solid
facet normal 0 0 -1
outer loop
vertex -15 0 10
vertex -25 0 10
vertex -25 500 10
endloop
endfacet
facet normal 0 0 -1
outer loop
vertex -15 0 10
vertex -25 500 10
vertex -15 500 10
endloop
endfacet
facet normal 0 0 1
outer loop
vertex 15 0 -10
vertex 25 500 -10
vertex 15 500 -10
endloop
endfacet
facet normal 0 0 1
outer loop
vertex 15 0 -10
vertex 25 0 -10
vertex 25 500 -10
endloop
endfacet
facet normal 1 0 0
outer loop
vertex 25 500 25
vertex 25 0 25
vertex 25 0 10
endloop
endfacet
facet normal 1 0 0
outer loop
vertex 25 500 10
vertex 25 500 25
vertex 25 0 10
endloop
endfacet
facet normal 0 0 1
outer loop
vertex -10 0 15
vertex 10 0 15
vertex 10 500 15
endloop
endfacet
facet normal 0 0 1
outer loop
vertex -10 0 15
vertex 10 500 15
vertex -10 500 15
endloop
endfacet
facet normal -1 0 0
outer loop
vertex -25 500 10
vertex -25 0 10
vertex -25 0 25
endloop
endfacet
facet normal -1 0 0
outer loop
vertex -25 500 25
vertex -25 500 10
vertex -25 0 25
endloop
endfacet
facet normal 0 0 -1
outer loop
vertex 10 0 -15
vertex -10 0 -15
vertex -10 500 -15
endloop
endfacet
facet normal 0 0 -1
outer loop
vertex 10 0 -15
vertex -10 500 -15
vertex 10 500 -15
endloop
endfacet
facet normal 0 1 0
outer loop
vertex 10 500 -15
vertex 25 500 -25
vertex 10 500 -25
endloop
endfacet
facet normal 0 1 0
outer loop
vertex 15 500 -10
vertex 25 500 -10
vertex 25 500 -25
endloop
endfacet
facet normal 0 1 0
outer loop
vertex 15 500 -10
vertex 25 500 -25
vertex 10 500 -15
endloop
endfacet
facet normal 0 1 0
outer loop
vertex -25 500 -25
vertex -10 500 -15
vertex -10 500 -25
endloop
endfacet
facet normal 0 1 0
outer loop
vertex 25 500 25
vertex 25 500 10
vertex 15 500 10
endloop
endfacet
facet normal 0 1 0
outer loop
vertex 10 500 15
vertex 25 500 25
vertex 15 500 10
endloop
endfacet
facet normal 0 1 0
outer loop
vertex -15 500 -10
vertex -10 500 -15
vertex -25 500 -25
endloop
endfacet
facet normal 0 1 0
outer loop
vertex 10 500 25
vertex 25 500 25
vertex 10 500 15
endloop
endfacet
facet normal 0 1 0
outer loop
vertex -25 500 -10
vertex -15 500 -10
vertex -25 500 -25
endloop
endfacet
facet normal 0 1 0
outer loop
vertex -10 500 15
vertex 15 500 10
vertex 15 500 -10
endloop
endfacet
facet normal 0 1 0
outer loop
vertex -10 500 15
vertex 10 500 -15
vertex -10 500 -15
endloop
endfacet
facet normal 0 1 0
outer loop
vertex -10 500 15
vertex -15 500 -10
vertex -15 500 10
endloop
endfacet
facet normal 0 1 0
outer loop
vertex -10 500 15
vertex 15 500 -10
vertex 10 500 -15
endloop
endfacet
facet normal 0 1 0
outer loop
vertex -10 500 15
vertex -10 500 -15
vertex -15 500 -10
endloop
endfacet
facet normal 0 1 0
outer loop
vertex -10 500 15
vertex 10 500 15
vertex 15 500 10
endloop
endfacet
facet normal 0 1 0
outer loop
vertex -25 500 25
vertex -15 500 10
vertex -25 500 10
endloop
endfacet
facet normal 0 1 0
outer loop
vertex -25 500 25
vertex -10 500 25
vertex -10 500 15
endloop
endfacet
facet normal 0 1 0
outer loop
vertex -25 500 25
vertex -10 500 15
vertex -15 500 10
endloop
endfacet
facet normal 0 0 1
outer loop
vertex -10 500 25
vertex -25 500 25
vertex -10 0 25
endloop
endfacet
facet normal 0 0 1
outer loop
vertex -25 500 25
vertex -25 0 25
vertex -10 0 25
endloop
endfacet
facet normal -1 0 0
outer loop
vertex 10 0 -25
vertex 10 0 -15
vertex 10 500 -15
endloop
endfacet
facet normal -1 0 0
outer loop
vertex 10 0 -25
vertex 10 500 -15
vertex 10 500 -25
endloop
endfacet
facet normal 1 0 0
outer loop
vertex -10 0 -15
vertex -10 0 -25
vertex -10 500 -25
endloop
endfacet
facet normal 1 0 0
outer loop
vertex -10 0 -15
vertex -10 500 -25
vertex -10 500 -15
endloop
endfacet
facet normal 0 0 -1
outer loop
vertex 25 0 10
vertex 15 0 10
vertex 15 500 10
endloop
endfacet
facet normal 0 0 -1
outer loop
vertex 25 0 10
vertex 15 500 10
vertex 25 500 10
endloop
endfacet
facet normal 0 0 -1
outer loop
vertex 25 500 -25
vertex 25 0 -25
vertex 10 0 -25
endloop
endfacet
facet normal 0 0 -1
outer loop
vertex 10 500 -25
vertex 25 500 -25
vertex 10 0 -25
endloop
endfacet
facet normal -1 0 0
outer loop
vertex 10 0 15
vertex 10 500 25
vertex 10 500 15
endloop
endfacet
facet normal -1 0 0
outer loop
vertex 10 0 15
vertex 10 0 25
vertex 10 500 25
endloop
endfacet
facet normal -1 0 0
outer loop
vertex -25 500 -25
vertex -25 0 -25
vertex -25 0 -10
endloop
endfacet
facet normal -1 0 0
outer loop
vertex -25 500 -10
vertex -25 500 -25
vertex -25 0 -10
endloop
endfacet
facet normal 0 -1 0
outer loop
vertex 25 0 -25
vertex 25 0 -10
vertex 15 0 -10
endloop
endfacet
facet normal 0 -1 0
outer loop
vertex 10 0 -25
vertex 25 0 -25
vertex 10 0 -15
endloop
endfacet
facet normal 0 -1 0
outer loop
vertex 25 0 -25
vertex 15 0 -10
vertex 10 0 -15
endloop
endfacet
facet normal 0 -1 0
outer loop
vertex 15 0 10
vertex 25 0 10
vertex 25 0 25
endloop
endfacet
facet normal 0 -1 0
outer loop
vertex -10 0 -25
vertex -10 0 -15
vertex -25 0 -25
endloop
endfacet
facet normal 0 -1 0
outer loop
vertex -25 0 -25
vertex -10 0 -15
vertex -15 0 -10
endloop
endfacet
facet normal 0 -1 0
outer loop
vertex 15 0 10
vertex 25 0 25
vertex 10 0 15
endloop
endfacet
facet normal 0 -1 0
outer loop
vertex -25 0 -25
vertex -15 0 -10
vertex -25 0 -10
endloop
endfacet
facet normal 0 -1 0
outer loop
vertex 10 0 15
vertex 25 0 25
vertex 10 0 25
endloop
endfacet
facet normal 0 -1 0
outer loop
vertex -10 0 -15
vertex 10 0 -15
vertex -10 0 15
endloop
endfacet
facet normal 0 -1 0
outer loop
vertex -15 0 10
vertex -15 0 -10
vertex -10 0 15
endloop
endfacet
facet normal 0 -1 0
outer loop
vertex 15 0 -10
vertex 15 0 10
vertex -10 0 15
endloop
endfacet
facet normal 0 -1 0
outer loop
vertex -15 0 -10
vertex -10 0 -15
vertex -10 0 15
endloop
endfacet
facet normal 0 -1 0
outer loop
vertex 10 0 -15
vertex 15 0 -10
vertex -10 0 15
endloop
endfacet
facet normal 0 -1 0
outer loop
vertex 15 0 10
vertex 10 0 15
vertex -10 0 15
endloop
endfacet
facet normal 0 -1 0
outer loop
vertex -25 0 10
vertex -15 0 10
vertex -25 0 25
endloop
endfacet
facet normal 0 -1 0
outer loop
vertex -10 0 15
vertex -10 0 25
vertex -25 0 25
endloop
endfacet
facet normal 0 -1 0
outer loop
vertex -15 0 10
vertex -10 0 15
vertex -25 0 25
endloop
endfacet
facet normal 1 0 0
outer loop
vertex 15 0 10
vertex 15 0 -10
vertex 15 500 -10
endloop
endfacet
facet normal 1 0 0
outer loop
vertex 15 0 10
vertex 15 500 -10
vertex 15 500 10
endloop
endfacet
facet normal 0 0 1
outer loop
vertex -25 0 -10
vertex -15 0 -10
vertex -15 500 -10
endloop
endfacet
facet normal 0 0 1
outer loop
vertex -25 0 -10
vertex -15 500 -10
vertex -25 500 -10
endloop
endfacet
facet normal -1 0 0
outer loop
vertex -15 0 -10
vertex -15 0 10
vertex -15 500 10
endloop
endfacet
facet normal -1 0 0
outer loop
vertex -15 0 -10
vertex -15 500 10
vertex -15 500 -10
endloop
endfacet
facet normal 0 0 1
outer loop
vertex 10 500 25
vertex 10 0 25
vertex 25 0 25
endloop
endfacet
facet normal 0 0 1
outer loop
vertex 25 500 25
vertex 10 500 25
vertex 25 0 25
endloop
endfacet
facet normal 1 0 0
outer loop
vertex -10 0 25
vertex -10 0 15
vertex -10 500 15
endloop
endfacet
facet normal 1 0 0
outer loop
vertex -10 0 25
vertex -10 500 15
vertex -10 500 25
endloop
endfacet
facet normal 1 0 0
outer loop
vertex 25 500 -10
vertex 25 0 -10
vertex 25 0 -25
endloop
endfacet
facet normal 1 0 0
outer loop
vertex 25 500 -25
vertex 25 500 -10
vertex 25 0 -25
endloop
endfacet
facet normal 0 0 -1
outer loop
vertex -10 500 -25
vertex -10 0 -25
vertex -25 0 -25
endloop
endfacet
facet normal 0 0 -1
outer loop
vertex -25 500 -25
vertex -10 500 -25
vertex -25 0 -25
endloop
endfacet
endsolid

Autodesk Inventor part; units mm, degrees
ref_plane "YZ Plane" through (0, 0, 0) normal (1, 0, 0) x (0, 1, 0)
ref_plane "XZ Plane" through (0, 0, 0) normal (0, 1, 0) x (-1, 0, 0)
ref_plane "XY Plane" through (0, 0, 0) normal (0, 0, 1) x (1, 0, 0)
sketch "Szkic1" plane through (0, 0, 0) normal (0, 1, 0) x (-1, 0, 0)
  line L0 (-25, -25) -> (25, -25)
  line L1 (25, -25) -> (25, 25)
  line L2 (-25, 25) -> (-25, -25)
  line L3 (-25, -25) -> (25, 25) construction
  line L4 (25, -25) -> (-25, 25) construction
  line L5 (10, 25) -> (-10, 25)
  line L6 (-10, 25) -> (-10, 15)
  line L7 (-10, 15) -> (10, 15)
  line L8 (10, 15) -> (10, 25)
  line L9 (-15, -10) -> (-15, 10)
  line L10 (-15, 10) -> (-25, 10)
  line L11 (-25, -10) -> (-15, -10)
  line L12 (10, -15) -> (-10, -15)
  line L13 (-10, -15) -> (-10, -25)
  line L14 (10, -25) -> (10, -15)
  line L15 (15, 10) -> (15, -10)
  line L16 (15, -10) -> (25, -10)
  line L17 (25, 10) -> (15, 10)
  line L18 (25, 25) -> (10, 25)
  line L19 (-10, 25) -> (-25, 25)
  point P0 (0, 0)
  dimension "d0" = 50
  dimension "d1" = 50
  dimension "d3" = 10
  dimension "d7" = 360
extrude "Wyciągnięcie proste1" add sketch "Szkic1" along normal blind 500 contours L2 L11 L9 L10 L19 L6 L7 L8 L18 L1 L17 L15 L16 L0 L14 L12 L13
properties part number "wysiegnik2" material "Aluminium 6061"
